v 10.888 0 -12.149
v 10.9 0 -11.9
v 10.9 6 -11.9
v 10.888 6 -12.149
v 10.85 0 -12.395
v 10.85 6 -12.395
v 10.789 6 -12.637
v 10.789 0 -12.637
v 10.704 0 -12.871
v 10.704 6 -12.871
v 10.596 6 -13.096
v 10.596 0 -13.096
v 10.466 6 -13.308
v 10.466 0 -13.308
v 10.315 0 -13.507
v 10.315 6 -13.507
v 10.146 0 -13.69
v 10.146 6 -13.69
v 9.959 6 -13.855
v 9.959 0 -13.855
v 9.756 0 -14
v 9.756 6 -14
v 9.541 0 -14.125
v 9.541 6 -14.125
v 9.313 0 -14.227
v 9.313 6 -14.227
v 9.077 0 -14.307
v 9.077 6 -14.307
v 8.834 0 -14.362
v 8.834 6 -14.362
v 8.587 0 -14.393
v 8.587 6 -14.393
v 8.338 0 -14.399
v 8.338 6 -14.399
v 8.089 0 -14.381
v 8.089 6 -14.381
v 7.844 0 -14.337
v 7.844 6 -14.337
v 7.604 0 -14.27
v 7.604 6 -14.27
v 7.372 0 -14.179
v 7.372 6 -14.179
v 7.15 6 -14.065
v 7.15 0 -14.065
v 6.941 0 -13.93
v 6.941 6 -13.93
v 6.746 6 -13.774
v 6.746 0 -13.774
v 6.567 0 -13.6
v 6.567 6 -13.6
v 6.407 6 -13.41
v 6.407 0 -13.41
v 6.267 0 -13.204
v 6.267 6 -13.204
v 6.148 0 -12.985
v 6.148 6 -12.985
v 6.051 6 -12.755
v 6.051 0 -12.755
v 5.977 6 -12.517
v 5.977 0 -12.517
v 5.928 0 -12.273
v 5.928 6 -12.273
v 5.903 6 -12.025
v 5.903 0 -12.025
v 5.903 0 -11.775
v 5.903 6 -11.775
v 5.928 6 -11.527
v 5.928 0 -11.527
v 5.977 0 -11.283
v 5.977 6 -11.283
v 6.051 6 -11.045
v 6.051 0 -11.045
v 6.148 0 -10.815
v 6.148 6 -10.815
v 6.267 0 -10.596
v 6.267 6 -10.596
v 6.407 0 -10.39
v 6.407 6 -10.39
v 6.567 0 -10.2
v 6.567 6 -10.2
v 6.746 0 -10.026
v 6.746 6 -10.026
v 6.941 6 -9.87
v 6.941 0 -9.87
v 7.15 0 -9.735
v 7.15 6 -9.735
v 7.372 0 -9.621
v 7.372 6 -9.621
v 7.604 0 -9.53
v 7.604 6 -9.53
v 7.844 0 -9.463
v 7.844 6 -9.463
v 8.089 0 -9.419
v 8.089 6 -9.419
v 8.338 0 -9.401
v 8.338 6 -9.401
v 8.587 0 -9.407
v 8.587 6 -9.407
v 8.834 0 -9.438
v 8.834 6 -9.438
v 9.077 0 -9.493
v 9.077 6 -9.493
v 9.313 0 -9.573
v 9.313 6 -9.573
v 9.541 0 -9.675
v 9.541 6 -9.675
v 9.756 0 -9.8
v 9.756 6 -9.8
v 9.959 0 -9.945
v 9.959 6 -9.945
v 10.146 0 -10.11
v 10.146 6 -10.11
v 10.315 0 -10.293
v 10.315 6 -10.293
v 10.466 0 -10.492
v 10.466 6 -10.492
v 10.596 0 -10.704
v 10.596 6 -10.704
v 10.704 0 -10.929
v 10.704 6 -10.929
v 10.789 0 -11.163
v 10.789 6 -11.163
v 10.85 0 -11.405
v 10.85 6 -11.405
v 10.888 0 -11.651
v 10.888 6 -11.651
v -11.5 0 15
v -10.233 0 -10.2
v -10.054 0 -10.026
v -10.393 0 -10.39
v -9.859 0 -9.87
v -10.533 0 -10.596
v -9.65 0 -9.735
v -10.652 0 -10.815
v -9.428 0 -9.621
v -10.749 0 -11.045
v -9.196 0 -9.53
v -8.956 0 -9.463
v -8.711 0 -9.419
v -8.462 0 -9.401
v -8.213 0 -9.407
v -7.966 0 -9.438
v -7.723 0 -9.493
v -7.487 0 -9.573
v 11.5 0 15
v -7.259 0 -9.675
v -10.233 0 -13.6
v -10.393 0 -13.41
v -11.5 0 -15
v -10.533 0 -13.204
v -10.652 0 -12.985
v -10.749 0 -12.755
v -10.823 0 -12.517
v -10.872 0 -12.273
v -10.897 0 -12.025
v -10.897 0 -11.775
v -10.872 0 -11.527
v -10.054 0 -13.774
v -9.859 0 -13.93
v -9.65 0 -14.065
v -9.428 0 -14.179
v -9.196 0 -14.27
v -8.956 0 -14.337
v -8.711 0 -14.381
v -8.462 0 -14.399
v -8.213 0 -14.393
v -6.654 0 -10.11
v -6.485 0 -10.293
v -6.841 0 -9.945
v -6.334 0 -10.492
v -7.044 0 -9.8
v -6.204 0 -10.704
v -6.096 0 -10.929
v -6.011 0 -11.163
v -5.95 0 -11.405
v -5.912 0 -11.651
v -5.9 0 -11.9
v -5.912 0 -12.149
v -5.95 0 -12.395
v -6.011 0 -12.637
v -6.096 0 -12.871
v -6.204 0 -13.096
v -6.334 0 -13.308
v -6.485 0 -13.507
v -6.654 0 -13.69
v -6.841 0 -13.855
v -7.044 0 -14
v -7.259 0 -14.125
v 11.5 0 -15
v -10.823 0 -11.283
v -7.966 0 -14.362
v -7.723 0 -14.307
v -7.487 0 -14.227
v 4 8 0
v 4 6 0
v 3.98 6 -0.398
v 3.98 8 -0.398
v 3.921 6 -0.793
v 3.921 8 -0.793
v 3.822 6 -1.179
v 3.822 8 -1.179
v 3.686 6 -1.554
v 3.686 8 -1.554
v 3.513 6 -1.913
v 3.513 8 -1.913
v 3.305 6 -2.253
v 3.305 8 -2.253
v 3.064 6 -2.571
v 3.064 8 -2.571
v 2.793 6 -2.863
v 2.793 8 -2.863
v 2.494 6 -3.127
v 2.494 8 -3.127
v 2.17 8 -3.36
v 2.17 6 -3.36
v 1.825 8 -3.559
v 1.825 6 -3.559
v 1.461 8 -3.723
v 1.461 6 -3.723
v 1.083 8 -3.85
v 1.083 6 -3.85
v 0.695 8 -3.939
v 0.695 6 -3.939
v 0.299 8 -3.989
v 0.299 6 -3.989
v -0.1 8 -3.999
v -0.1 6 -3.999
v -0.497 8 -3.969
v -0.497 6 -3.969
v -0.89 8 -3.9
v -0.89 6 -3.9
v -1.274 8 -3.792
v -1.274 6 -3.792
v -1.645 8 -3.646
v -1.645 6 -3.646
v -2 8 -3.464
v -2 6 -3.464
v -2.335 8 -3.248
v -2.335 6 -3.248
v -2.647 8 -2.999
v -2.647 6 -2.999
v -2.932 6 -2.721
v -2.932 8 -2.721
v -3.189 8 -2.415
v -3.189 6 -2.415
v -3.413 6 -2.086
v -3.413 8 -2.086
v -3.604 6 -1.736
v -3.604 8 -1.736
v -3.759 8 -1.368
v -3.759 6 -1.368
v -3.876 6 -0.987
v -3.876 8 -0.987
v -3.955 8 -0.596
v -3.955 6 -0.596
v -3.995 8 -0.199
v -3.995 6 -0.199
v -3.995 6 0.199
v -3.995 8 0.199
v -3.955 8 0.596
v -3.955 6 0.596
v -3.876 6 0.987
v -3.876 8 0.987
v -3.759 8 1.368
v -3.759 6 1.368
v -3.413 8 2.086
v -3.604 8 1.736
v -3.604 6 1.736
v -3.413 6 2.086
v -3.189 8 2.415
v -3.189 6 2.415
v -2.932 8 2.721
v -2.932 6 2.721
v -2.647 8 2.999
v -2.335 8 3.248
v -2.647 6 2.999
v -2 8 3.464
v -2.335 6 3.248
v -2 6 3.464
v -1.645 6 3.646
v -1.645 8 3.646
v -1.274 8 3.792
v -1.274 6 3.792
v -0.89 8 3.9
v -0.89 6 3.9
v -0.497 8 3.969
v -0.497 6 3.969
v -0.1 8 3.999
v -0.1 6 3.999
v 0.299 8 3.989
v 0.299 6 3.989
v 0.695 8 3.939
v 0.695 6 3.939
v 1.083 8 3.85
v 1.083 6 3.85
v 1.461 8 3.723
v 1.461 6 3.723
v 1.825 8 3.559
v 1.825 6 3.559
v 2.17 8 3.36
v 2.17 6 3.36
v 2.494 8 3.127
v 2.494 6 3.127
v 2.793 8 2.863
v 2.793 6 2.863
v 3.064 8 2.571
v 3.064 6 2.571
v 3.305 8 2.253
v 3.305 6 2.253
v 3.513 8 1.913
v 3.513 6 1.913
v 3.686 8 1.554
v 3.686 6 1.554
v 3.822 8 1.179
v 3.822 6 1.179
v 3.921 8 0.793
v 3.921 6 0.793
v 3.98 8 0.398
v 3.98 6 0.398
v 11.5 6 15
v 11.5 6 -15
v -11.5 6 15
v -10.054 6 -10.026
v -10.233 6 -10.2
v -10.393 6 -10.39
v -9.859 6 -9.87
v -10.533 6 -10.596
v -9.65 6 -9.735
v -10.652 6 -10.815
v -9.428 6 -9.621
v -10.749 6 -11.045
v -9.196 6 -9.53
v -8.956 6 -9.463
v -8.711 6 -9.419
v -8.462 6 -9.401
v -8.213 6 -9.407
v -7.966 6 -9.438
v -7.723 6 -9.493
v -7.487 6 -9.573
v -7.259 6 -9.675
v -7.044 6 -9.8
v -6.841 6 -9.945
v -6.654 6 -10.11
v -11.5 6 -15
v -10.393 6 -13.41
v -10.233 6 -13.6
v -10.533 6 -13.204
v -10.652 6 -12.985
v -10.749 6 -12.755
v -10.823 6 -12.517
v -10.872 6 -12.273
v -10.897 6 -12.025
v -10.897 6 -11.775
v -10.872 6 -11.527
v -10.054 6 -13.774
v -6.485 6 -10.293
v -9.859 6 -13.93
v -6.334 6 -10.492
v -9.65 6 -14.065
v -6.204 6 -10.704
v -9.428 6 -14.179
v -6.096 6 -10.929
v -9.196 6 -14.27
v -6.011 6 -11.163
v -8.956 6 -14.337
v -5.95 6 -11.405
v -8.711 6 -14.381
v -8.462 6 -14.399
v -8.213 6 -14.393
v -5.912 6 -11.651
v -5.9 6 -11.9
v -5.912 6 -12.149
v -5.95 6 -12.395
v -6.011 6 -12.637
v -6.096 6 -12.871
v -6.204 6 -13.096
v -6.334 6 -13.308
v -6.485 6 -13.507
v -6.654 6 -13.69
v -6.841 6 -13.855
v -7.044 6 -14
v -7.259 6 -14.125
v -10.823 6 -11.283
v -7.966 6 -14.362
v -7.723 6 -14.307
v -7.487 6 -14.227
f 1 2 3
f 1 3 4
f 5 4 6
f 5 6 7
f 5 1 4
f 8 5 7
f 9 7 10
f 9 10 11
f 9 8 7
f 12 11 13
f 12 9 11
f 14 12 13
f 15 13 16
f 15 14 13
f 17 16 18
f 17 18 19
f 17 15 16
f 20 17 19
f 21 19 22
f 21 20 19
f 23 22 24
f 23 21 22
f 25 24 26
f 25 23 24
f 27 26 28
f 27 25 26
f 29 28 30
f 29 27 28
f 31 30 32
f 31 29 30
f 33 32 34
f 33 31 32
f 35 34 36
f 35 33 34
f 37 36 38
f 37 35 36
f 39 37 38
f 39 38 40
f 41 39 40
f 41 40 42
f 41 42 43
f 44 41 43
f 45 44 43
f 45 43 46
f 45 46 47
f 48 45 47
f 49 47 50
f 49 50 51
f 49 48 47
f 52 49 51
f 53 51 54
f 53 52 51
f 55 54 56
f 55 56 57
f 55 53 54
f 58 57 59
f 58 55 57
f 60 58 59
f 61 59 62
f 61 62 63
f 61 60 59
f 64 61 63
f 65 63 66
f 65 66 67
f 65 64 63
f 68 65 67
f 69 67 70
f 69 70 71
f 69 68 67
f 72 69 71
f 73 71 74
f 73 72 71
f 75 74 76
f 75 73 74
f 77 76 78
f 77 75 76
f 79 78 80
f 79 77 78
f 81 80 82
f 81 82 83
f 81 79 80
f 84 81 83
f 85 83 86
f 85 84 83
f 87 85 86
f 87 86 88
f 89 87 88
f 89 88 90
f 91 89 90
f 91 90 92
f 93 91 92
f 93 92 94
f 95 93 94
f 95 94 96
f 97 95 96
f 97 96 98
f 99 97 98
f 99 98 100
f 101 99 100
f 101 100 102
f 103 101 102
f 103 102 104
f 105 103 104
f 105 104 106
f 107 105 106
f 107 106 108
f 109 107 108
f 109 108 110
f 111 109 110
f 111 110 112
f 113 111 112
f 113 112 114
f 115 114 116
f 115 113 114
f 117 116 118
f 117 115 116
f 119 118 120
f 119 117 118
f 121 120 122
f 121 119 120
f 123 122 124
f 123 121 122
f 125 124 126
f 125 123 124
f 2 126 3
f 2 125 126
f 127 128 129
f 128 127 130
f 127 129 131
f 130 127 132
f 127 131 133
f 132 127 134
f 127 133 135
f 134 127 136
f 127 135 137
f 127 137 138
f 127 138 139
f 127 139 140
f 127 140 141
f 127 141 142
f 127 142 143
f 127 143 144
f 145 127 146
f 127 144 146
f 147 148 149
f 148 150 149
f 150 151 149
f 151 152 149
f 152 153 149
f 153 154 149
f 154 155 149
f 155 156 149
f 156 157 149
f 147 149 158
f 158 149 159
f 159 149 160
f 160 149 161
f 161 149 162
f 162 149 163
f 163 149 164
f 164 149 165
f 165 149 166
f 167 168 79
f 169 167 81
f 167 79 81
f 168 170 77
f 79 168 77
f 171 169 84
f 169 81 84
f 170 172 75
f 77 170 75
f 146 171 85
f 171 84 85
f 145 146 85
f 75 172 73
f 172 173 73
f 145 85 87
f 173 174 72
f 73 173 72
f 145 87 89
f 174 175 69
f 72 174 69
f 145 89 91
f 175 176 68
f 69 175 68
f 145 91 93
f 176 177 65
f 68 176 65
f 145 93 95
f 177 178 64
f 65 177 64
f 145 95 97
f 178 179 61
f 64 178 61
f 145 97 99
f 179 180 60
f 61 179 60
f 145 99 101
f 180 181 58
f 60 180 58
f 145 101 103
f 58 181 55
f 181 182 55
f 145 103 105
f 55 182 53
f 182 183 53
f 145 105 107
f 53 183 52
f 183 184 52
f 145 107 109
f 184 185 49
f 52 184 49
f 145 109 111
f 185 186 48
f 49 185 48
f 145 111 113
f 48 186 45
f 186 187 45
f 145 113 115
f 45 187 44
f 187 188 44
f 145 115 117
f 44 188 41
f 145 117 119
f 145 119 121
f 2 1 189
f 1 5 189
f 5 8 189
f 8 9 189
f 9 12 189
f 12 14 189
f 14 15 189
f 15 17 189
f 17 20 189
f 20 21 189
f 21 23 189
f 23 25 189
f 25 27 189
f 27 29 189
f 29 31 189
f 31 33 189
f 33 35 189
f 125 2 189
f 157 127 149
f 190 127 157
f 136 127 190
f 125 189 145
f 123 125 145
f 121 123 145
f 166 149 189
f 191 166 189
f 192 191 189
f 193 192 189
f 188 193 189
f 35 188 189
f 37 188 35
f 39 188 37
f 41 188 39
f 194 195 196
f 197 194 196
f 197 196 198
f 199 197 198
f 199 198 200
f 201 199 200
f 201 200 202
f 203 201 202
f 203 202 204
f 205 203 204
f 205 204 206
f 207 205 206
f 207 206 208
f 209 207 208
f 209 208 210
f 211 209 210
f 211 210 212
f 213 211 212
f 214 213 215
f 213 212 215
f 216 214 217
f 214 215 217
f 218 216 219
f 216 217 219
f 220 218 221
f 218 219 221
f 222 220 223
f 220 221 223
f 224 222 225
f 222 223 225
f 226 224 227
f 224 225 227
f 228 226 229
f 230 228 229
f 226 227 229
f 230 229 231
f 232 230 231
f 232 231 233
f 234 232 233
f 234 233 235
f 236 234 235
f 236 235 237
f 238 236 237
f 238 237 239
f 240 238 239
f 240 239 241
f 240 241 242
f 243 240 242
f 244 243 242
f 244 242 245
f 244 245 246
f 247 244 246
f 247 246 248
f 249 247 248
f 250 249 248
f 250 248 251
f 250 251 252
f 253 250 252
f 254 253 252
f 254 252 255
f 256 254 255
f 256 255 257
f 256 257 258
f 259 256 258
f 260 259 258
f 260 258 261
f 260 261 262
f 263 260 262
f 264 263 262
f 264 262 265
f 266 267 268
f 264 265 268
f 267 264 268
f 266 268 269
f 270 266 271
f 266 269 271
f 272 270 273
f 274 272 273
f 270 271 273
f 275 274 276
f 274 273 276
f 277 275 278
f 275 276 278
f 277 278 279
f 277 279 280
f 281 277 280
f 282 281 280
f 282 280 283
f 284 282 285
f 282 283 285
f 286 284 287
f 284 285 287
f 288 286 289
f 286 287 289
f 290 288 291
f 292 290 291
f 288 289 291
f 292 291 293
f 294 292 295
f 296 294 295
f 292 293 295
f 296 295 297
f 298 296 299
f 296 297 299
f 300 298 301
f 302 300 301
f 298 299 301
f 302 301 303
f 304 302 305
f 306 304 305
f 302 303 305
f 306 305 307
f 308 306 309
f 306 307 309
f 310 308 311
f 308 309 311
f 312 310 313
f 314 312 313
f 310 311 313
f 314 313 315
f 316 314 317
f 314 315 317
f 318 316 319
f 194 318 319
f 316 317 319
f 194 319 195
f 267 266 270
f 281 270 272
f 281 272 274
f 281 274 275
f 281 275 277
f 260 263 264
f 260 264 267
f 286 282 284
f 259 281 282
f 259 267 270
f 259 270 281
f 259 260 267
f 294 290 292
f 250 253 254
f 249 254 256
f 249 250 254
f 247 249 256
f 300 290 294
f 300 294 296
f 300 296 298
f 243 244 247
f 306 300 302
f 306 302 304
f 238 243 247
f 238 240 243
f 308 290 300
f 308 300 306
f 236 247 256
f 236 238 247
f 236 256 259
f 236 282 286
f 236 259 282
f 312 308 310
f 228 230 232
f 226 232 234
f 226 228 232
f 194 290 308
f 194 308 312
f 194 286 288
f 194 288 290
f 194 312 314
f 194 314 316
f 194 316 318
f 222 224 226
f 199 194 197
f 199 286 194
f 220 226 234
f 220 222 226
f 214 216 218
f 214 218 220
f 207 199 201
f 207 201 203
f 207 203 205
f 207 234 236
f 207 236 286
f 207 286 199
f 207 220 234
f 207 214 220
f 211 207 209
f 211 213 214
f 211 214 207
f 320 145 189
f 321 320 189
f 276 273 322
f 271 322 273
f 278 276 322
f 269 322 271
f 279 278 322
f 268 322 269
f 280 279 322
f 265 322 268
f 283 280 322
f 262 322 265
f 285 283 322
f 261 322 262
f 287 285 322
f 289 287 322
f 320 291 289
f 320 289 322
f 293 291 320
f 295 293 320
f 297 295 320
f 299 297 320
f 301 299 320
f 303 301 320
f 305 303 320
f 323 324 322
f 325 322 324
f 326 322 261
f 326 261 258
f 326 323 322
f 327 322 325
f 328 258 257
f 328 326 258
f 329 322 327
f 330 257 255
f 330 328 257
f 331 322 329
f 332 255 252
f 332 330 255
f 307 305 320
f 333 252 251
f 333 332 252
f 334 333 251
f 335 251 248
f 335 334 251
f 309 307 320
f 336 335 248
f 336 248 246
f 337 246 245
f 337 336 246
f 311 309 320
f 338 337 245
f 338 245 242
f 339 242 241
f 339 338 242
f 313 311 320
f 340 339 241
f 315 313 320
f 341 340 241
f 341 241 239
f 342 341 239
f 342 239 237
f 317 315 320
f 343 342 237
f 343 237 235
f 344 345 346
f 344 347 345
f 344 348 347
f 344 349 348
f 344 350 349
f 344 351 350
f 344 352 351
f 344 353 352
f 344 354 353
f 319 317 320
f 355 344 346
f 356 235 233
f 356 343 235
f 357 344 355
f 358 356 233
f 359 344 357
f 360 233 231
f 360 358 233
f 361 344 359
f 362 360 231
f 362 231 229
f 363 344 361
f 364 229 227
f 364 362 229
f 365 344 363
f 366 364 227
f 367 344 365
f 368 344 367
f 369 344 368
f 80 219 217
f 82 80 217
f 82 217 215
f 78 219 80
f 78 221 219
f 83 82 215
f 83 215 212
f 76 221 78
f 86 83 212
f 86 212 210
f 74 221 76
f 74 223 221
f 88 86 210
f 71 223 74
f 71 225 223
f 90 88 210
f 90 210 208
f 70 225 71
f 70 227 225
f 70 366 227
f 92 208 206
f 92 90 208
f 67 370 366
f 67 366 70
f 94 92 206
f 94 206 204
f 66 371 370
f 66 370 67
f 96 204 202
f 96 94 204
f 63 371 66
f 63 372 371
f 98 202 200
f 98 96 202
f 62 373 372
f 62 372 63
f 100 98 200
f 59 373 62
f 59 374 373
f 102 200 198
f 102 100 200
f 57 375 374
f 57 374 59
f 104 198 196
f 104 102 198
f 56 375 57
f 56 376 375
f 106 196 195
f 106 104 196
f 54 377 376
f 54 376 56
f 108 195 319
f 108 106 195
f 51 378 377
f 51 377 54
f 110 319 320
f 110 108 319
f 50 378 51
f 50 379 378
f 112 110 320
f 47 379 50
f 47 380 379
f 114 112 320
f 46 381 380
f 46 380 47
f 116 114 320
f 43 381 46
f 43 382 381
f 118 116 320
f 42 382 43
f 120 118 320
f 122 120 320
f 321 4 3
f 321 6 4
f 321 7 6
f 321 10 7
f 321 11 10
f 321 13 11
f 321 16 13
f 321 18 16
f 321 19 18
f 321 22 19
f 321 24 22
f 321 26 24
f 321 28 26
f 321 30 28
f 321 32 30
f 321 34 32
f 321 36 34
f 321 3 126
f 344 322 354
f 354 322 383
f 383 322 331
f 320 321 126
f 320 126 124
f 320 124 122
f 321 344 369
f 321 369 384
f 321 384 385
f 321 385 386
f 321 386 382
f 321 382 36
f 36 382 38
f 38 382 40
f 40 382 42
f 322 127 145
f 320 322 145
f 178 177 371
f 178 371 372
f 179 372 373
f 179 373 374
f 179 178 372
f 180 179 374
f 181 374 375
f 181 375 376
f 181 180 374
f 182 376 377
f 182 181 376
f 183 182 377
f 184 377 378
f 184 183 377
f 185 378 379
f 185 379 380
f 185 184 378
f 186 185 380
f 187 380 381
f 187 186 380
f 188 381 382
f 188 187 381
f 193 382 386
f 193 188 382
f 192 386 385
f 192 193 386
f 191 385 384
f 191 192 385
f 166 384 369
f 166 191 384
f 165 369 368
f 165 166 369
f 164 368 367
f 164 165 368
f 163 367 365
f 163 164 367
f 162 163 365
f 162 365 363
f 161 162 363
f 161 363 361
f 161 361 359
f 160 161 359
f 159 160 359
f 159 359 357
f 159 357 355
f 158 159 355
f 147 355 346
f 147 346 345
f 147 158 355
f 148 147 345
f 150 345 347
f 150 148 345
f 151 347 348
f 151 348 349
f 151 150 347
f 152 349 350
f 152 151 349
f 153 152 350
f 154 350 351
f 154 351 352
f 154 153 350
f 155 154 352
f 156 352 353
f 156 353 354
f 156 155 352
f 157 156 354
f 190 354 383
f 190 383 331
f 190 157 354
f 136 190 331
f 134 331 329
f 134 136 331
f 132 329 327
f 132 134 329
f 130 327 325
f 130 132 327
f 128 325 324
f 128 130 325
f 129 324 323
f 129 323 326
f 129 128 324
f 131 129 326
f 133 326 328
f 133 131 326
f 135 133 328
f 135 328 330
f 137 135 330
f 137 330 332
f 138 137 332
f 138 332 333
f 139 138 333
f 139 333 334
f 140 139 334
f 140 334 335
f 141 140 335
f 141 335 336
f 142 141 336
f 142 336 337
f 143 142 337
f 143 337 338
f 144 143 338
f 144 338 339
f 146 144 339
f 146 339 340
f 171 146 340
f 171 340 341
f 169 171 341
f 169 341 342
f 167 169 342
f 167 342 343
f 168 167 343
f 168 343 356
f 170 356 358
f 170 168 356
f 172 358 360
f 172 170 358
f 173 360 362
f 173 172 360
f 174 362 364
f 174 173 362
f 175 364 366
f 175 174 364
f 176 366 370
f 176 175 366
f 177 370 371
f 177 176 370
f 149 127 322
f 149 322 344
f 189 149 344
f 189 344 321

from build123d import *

# Parameters (mm, degrees)
SKETCH1_W           = 23
SKETCH1_H           = 30
SKETCH1_R           = 2.5
BOSS_EXTRUDE1_DEPTH = 6
BOSS_EXTRUDE2_START = -6
SKETCH2_R           = 4
BOSS_EXTRUDE2_DEPTH = 8


with BuildPart() as part:
    # Sketch1 → Boss-Extrude1 (new body)
    with BuildSketch(Plane(origin=(0, 0, 0), x_dir=(1, 0, 0), z_dir=(0, 1, 0))):
        Rectangle(SKETCH1_W, SKETCH1_H)
        with Locations((-8.4, 11.9)):
            Circle(SKETCH1_R, mode=Mode.SUBTRACT)
        with Locations((8.4, 11.9)):
            Circle(SKETCH1_R, mode=Mode.SUBTRACT)
    extrude(amount=BOSS_EXTRUDE1_DEPTH)

    # Sketch2 → Boss-Extrude2 (add)
    with BuildSketch(Plane(origin=(0, 6, 0), x_dir=(1, 0, 0), z_dir=(0, 1, 0)).offset(BOSS_EXTRUDE2_START)):
        Circle(SKETCH2_R)
    extrude(amount=BOSS_EXTRUDE2_DEPTH)


solid = part.part
